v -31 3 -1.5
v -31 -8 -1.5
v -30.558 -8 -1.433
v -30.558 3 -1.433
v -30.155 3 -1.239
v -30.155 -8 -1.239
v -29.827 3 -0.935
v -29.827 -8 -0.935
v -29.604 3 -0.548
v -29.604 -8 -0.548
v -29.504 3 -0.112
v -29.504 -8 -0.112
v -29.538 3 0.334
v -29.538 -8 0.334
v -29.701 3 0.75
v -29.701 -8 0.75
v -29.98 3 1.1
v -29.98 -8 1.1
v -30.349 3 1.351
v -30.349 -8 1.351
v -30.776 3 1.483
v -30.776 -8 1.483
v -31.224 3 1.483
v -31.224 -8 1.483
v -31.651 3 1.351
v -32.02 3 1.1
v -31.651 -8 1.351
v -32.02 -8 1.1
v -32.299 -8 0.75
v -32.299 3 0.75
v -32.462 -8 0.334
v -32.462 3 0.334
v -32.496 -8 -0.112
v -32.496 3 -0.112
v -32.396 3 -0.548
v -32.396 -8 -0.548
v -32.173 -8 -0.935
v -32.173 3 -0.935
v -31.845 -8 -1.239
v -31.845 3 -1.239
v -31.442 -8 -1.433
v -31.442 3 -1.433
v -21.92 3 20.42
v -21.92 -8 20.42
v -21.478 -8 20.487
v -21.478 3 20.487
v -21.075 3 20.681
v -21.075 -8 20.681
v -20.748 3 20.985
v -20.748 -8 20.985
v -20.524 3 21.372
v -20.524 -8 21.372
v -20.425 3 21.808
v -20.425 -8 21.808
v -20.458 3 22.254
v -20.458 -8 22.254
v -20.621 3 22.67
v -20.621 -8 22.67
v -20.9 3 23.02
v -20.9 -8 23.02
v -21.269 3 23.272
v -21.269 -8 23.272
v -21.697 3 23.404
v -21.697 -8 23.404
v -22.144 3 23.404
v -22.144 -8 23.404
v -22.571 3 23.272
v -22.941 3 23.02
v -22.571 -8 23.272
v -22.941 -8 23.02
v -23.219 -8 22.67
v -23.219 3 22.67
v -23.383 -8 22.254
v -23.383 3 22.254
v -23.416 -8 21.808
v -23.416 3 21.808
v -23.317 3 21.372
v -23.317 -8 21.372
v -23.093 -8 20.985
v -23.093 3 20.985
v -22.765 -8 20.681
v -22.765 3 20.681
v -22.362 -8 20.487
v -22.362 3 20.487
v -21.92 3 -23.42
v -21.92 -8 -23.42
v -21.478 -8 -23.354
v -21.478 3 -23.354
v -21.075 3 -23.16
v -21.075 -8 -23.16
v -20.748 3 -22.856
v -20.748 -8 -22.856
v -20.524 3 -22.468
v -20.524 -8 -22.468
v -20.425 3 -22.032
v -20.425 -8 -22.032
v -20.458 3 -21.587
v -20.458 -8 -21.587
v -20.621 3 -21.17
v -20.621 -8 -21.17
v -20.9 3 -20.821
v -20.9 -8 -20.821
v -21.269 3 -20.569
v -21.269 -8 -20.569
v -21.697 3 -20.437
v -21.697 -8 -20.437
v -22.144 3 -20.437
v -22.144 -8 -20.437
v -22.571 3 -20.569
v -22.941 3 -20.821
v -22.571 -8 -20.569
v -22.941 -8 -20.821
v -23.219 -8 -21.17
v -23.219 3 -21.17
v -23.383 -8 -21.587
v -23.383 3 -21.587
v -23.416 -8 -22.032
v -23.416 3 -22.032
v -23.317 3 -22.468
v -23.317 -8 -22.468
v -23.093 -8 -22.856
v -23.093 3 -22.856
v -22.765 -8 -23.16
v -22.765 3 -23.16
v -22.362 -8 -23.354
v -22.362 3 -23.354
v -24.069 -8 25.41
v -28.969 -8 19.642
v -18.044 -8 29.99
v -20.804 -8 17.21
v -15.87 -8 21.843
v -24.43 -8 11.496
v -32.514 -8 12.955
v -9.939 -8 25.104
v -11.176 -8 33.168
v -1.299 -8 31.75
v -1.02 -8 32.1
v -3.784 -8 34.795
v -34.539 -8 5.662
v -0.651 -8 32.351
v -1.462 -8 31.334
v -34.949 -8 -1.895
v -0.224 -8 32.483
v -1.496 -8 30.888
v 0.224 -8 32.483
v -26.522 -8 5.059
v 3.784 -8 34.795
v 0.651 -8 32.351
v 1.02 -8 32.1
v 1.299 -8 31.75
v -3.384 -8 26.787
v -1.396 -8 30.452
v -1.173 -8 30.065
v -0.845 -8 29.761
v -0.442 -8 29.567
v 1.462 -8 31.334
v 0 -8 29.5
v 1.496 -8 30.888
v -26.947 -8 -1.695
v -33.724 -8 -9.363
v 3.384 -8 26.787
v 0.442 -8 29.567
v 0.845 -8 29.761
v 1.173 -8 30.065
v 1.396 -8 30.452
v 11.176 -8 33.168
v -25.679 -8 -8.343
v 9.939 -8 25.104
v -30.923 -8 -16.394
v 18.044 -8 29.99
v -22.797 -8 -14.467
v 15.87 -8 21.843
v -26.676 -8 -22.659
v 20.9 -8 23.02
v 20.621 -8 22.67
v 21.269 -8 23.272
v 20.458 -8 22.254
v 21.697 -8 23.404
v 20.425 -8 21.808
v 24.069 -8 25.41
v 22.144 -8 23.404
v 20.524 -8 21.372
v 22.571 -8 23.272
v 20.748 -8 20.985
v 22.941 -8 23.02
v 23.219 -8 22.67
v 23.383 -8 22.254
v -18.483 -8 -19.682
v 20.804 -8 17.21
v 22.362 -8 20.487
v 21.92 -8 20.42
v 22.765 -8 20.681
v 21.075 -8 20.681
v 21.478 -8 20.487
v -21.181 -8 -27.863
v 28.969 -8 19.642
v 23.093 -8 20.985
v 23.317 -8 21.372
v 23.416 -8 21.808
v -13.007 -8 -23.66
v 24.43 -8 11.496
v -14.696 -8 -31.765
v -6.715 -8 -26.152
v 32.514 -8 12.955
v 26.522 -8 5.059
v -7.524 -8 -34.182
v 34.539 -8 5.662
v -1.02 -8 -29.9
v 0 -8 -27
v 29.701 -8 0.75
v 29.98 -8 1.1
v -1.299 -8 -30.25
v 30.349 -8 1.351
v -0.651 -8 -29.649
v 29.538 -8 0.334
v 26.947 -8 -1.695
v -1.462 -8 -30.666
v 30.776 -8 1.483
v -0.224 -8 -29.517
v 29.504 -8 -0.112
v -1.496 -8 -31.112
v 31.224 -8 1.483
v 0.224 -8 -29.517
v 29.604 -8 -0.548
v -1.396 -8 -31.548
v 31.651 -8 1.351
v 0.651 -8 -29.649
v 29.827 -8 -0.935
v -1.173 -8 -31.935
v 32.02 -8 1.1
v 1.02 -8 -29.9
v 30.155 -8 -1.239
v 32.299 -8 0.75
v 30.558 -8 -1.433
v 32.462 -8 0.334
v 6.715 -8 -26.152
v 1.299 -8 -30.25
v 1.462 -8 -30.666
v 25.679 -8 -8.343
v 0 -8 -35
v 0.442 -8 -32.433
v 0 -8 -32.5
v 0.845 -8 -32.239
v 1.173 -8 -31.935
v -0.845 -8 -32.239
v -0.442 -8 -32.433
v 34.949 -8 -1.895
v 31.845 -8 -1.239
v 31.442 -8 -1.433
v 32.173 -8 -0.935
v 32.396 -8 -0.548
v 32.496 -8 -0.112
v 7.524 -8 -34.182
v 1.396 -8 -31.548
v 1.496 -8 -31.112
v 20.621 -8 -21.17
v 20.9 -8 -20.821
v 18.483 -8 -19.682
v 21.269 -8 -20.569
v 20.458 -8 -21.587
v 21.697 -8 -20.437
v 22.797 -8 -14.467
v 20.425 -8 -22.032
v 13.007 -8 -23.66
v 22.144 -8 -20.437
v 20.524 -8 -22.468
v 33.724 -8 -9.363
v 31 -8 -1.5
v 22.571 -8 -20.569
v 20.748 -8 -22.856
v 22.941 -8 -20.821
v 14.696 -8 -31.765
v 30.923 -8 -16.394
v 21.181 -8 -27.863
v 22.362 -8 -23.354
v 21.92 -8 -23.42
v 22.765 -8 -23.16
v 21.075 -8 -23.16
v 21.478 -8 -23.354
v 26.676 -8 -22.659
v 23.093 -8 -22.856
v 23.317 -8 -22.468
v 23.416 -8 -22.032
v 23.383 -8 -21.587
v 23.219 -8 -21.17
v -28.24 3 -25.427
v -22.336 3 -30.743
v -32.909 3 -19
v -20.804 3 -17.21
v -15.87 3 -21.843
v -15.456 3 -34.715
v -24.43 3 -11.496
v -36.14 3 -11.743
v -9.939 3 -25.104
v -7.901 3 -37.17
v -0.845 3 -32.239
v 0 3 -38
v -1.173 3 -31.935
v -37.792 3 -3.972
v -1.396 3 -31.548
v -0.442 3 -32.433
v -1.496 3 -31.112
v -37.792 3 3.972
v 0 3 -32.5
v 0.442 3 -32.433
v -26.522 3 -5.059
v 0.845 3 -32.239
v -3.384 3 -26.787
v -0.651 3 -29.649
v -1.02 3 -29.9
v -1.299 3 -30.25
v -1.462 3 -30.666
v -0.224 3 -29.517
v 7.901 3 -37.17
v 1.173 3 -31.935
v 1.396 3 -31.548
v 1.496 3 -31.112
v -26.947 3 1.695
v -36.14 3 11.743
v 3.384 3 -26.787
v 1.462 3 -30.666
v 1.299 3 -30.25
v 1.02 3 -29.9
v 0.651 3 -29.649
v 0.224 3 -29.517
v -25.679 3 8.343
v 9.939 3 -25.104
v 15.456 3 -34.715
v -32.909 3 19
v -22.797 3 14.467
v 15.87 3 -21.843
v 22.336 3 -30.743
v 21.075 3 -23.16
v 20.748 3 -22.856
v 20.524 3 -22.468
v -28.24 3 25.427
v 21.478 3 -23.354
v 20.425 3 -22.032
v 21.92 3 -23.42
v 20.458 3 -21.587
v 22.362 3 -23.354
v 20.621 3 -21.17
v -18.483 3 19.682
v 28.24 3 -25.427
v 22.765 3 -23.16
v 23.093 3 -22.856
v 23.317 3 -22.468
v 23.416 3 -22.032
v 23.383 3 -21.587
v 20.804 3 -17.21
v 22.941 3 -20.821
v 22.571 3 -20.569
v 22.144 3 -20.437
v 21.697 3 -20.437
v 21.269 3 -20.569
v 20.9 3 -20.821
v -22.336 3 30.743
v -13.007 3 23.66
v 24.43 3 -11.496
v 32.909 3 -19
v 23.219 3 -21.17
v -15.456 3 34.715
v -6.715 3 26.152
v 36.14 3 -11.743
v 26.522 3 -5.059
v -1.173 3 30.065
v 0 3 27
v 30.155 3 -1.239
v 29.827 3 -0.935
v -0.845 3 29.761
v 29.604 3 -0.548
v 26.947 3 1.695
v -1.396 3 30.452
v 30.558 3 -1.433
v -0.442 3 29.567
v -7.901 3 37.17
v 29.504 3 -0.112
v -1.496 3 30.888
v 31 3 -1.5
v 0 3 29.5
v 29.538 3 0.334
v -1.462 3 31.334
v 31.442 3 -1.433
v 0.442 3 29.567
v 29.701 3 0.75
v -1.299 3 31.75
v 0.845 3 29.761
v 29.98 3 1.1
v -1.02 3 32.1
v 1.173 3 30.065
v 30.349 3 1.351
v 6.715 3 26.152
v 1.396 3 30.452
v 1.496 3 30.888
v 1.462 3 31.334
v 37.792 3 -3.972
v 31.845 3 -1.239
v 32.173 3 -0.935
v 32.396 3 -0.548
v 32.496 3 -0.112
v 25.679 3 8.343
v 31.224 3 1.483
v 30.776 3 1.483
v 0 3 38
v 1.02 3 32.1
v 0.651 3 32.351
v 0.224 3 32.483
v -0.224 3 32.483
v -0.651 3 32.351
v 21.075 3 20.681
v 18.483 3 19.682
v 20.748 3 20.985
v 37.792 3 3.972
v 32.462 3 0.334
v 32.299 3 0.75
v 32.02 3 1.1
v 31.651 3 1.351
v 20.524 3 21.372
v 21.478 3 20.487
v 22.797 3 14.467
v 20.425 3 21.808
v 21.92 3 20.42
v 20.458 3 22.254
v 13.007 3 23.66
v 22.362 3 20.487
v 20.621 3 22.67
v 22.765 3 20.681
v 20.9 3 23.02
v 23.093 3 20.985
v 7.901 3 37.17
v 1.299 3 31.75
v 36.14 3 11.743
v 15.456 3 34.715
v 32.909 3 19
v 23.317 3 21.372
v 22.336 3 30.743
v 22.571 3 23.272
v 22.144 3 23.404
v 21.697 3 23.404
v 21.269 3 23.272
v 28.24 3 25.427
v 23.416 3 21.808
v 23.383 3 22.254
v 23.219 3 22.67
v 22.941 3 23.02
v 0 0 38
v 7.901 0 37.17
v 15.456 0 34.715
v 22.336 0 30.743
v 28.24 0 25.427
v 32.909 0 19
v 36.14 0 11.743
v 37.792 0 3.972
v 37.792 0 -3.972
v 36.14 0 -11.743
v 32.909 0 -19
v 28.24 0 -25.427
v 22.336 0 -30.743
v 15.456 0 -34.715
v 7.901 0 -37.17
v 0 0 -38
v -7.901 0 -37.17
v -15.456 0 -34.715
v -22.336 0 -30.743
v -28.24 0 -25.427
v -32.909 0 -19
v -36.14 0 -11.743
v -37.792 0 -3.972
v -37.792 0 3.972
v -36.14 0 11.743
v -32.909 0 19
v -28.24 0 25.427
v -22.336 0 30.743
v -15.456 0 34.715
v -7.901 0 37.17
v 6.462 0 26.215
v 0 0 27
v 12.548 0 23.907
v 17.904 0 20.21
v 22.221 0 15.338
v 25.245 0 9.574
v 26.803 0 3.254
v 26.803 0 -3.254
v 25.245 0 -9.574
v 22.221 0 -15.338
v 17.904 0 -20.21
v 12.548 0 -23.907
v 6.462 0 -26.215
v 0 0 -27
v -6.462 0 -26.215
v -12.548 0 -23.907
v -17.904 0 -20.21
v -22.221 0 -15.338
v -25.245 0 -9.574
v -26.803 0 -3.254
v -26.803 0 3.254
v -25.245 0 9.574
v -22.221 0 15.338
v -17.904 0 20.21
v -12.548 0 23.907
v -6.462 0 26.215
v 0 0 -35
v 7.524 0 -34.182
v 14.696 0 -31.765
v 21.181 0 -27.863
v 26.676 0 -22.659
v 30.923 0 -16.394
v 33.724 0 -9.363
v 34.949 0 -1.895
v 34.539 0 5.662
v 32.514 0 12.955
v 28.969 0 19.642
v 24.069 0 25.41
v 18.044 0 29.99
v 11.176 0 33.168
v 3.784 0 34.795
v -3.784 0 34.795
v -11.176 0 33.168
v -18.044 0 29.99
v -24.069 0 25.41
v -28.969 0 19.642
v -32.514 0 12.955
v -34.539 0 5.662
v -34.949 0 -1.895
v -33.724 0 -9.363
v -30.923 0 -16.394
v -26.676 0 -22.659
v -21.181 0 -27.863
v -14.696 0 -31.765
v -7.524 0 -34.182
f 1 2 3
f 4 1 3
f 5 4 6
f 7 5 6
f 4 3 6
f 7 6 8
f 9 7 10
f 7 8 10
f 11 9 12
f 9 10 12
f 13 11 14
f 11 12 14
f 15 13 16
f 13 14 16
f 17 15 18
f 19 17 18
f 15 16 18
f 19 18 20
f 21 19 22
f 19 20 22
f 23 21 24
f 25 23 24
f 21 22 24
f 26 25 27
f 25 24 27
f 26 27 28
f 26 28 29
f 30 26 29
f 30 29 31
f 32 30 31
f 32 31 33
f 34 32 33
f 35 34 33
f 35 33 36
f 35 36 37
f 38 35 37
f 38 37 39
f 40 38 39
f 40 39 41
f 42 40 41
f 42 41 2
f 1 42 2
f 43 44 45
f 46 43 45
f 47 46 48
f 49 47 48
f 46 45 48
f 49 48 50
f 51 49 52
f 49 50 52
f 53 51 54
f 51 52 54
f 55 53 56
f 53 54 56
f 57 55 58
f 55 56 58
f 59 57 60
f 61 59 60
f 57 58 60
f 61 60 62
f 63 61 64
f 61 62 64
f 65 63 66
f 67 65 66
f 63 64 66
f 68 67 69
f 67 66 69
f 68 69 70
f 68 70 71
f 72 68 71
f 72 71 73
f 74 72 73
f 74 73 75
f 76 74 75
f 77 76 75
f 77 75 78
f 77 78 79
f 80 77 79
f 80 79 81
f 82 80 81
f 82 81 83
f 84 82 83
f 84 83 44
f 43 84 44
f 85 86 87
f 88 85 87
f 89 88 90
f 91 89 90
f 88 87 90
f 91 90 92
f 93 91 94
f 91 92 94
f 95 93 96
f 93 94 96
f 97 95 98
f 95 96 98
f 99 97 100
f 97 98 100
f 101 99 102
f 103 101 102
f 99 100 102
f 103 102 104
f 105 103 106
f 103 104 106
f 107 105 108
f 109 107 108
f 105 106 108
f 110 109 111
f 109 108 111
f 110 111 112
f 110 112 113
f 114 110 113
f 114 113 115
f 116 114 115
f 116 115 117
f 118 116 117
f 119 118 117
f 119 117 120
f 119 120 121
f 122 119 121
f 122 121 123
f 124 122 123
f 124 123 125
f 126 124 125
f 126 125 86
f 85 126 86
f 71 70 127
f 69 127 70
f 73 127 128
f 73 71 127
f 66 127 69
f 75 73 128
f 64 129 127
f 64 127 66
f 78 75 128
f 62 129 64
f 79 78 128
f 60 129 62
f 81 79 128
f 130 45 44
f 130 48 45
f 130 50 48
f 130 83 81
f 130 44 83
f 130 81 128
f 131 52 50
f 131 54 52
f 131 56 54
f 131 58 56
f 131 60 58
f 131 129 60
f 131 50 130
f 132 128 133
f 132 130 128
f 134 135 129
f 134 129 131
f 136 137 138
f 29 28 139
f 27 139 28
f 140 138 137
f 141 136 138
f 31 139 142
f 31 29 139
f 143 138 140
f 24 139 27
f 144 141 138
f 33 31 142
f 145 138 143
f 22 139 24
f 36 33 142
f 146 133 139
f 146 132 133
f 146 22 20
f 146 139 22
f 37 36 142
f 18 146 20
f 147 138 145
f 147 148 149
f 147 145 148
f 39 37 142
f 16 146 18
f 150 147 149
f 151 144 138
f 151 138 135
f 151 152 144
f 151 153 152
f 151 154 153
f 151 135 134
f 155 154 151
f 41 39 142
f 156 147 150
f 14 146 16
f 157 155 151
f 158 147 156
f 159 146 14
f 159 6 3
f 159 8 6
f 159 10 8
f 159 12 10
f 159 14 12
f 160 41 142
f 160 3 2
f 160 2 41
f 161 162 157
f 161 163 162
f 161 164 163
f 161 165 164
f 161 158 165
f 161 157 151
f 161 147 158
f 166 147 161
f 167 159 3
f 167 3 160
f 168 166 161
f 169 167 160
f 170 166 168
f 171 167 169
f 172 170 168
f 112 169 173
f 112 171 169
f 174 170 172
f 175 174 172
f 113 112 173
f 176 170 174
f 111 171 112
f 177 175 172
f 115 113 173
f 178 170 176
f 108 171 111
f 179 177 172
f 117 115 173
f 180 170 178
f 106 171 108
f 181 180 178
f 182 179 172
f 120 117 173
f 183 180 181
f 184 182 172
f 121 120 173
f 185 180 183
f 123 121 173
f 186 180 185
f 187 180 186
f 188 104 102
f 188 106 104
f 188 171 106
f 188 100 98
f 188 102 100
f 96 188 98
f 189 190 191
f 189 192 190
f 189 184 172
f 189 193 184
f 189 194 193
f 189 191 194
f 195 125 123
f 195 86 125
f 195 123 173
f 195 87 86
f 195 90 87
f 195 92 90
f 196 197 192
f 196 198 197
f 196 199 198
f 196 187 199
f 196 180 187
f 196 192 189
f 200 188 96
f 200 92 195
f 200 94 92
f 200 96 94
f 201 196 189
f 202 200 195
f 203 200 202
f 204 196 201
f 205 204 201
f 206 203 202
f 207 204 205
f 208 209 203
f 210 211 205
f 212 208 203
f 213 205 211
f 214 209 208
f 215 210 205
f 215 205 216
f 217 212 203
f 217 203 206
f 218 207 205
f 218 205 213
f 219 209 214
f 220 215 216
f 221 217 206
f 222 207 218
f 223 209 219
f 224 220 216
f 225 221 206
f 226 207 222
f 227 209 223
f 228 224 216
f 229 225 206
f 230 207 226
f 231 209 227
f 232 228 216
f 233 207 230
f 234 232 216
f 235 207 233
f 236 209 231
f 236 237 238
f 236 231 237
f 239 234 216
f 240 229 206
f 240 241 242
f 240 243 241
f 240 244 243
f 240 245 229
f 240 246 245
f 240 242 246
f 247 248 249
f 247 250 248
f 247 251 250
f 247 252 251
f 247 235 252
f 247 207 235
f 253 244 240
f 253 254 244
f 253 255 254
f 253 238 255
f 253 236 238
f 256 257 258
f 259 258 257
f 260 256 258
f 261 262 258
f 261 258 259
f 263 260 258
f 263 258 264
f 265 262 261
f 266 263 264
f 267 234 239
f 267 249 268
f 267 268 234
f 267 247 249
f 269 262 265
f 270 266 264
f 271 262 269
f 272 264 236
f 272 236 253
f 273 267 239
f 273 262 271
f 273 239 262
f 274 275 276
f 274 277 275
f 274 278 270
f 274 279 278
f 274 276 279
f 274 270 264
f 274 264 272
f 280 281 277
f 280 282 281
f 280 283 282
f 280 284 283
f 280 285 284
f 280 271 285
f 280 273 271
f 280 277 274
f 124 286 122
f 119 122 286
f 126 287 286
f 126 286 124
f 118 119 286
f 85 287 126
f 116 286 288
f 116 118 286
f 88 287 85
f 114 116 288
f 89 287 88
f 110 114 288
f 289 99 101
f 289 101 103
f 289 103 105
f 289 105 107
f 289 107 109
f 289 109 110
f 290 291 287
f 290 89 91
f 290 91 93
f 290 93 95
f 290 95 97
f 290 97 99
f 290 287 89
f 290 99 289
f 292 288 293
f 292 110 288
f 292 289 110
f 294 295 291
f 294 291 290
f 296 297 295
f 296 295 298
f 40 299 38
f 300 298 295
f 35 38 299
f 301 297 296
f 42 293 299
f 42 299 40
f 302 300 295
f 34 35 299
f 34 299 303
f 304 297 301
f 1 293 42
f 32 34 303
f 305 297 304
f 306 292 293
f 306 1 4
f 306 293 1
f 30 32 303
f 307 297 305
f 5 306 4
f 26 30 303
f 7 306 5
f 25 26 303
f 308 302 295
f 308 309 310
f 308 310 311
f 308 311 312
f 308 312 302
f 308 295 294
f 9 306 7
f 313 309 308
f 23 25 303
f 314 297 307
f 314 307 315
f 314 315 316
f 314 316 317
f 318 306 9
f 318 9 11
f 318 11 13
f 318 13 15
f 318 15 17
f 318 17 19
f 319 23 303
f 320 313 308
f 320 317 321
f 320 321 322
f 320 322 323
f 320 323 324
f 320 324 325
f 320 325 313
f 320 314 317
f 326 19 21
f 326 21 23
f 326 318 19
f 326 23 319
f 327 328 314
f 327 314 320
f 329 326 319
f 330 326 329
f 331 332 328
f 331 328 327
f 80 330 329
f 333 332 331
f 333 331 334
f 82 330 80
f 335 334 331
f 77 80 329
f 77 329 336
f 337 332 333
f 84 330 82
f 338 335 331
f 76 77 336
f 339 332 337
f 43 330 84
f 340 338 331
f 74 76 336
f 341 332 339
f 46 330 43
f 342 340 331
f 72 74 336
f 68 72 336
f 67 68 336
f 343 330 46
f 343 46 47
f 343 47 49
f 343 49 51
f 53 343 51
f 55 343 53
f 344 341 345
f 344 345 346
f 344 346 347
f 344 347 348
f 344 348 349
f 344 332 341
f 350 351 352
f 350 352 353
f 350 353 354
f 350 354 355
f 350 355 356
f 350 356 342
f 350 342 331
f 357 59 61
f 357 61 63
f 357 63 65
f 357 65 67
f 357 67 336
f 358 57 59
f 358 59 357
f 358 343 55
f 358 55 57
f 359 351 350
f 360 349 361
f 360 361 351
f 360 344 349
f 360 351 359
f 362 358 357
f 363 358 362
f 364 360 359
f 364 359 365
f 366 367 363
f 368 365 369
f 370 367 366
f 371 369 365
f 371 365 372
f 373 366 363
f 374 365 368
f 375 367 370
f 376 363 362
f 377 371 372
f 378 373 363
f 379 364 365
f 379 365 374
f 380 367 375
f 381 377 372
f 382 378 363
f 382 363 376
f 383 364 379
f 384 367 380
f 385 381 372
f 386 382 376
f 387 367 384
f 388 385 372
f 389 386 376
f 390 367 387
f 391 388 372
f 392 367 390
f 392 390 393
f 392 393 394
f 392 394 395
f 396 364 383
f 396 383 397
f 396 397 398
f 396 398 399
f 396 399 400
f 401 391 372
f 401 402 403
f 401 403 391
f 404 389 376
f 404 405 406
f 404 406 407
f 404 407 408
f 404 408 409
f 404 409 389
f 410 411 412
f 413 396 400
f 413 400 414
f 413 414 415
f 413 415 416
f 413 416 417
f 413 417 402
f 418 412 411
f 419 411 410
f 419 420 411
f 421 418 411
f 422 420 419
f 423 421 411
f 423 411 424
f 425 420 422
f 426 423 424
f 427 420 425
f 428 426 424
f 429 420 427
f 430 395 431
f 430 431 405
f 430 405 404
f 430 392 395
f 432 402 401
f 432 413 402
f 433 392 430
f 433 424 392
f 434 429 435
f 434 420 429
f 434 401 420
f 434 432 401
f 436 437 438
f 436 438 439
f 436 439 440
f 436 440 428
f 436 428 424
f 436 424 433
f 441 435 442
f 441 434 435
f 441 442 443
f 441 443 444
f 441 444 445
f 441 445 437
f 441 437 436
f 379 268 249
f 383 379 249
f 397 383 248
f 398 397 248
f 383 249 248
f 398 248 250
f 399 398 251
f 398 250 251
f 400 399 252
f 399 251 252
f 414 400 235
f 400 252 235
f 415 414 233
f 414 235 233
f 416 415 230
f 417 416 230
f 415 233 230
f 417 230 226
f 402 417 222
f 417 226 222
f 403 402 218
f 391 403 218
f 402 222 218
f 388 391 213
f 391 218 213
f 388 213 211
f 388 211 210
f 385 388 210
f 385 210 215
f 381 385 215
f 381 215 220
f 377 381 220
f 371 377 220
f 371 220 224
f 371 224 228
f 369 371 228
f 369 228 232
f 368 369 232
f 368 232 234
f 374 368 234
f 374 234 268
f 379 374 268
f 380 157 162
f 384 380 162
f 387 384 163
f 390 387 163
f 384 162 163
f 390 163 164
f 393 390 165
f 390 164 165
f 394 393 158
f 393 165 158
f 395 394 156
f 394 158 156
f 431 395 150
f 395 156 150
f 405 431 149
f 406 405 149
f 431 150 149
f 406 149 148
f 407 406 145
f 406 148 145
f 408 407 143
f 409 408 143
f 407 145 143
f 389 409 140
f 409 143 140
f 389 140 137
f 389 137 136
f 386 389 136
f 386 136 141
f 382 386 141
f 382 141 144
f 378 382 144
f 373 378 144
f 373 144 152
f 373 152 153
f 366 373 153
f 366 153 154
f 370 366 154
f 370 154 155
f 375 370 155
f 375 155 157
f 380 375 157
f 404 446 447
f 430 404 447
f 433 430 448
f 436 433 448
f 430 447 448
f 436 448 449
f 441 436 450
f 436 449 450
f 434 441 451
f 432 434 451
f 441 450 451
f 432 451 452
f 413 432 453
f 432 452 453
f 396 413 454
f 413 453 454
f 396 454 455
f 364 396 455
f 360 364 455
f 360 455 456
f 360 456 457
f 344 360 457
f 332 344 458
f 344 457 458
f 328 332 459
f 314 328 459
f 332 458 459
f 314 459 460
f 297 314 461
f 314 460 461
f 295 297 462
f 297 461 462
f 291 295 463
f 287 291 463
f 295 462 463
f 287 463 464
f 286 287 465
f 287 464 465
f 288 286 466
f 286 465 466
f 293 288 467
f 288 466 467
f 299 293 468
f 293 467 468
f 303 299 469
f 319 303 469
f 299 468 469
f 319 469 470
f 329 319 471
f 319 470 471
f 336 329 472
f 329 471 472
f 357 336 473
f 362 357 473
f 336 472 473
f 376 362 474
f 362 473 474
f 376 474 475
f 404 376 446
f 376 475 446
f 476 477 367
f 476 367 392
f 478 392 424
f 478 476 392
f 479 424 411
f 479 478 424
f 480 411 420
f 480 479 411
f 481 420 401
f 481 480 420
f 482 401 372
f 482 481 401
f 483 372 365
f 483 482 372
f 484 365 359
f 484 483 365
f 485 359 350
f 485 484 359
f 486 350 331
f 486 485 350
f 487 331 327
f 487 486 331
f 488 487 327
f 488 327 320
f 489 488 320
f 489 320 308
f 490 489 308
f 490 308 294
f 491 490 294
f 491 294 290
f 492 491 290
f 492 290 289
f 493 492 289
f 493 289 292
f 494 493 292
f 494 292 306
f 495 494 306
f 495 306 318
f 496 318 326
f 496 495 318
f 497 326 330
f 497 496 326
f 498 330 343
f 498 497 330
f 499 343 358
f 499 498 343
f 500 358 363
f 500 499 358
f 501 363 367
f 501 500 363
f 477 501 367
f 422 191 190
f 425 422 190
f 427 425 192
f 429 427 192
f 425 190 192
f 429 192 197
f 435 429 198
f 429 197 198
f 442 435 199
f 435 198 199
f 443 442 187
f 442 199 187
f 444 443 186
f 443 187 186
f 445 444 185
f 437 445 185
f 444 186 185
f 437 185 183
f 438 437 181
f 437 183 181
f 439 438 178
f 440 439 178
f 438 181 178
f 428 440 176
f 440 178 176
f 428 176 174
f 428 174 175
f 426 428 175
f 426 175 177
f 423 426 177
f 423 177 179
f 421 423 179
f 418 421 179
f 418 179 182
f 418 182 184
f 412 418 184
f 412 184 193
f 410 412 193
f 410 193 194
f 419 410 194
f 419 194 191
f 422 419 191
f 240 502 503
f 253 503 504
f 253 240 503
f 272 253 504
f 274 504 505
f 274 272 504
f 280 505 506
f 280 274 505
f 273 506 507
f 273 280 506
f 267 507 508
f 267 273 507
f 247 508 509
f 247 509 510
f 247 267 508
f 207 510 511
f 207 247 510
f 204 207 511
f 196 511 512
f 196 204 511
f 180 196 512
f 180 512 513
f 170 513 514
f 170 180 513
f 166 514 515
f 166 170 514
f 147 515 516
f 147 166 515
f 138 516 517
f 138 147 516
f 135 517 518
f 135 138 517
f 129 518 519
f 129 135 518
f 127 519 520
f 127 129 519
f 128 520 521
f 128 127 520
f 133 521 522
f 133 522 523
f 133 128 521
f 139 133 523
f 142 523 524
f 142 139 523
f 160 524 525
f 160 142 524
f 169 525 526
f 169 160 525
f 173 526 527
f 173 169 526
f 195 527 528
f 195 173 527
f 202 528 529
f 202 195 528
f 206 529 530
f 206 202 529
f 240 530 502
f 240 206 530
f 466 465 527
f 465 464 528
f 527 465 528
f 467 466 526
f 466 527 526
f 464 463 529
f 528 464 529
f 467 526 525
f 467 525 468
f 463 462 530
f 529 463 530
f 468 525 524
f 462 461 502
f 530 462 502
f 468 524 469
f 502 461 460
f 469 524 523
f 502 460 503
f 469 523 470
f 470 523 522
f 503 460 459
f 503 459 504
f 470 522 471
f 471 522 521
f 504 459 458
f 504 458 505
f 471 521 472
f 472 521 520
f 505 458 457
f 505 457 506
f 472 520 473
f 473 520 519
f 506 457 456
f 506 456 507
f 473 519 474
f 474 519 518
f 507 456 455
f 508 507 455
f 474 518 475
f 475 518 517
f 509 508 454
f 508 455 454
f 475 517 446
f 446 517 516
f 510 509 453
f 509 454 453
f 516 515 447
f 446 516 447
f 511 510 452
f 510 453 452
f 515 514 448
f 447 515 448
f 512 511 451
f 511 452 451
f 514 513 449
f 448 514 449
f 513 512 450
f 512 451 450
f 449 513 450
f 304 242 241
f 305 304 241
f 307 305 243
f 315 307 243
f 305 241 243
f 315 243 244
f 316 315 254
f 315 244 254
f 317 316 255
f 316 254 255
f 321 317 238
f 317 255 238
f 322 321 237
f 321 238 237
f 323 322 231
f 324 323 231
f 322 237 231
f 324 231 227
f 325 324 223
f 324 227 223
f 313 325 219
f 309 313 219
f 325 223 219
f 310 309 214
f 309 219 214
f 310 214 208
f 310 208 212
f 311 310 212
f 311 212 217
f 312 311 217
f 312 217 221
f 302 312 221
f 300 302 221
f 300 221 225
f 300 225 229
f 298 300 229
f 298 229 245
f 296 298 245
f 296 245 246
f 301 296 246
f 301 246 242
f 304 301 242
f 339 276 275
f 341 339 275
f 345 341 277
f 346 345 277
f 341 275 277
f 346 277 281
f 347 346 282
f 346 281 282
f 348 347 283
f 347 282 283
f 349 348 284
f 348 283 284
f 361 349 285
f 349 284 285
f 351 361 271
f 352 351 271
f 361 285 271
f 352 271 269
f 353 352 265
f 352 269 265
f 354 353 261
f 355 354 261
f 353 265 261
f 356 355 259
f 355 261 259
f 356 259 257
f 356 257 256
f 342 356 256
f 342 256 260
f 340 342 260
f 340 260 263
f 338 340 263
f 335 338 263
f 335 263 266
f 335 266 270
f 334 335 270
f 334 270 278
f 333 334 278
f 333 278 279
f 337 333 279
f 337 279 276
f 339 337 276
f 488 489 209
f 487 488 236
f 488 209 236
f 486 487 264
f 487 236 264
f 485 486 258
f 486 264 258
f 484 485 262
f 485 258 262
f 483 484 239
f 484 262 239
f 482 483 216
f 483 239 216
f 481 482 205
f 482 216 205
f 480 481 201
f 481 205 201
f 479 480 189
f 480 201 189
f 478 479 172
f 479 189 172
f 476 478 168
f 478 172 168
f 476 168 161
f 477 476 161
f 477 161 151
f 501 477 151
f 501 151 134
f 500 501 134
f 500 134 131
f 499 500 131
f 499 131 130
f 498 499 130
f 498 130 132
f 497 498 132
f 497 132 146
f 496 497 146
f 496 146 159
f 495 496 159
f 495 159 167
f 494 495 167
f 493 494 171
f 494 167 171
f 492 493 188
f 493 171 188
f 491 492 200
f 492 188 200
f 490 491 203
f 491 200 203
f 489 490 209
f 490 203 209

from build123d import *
from build123d.topology import SkipClean

# Parameters (mm, degrees)
SKETCH_1_R          = 38
SKETCH_1_R_2        = 27
EXTRUDE_1_DEPTH     = 3
EXTRUDE_START       = 8
SKETCH_2_R          = 35
SKETCH_2_R_2        = 27
EXTRUDE_2_DEPTH     = 8
SKETCH_4_R          = 1.5
CUT_EXTRUDE_1_DEPTH = 55.854352608


with BuildPart() as part:
    # 草图1 → 凸台-拉伸1 (new body)
    with BuildSketch(Plane(origin=(0, 0, 0), x_dir=(1, 0, 0), z_dir=(0, 1, 0))):
        with Locations(Location((0, 0, 0), (0, 0, 270))):
            Circle(SKETCH_1_R)
        with Locations(Location((0, 0, 0), (0, 0, 270))):
            Circle(SKETCH_1_R_2, mode=Mode.SUBTRACT)
    extrude(amount=EXTRUDE_1_DEPTH)

    # 草图2 → 凸台-拉伸2 (add)
    with SkipClean():  # the faces are left unmerged after this step: merging them gives an invalid solid
        with BuildSketch(Plane.XZ.offset(EXTRUDE_START)):
            with Locations(Location((0, 0, 0), (0, 0, 270))):
                Circle(SKETCH_2_R)
            with Locations(Location((0, 0, 0), (0, 0, 270))):
                Circle(SKETCH_2_R_2, mode=Mode.SUBTRACT)
        extrude(amount=-EXTRUDE_2_DEPTH)

    # 草图4 → 切除-拉伸1 (cut, through all)
    with SkipClean():  # the faces are left unmerged after this step: merging them gives an invalid solid
        with BuildSketch(Plane.XZ.offset(8)):
            with Locations(Location((0, 31, 0), (0, 0, 270))):
                Circle(SKETCH_4_R)
            with Locations(Location((21.920310217, 21.920310217, 0), (0, 0, 270))):
                Circle(SKETCH_4_R)
            with Locations(Location((31, 0, 0), (0, 0, 270))):
                Circle(SKETCH_4_R)
            with Locations(Location((21.920310217, -21.920310217, 0), (0, 0, 270))):
                Circle(SKETCH_4_R)
            with Locations(Location((0, -31, 0), (0, 0, 270))):
                Circle(SKETCH_4_R)
            with Locations(Location((-21.920310217, -21.920310217, 0), (0, 0, 270))):
                Circle(SKETCH_4_R)
            with Locations(Location((-31, 0, 0), (0, 0, 270))):
                Circle(SKETCH_4_R)
            with Locations(Location((-21.920310217, 21.920310217, 0), (0, 0, 270))):
                Circle(SKETCH_4_R)
        extrude(amount=-CUT_EXTRUDE_1_DEPTH, mode=Mode.SUBTRACT)


solid = part.part
